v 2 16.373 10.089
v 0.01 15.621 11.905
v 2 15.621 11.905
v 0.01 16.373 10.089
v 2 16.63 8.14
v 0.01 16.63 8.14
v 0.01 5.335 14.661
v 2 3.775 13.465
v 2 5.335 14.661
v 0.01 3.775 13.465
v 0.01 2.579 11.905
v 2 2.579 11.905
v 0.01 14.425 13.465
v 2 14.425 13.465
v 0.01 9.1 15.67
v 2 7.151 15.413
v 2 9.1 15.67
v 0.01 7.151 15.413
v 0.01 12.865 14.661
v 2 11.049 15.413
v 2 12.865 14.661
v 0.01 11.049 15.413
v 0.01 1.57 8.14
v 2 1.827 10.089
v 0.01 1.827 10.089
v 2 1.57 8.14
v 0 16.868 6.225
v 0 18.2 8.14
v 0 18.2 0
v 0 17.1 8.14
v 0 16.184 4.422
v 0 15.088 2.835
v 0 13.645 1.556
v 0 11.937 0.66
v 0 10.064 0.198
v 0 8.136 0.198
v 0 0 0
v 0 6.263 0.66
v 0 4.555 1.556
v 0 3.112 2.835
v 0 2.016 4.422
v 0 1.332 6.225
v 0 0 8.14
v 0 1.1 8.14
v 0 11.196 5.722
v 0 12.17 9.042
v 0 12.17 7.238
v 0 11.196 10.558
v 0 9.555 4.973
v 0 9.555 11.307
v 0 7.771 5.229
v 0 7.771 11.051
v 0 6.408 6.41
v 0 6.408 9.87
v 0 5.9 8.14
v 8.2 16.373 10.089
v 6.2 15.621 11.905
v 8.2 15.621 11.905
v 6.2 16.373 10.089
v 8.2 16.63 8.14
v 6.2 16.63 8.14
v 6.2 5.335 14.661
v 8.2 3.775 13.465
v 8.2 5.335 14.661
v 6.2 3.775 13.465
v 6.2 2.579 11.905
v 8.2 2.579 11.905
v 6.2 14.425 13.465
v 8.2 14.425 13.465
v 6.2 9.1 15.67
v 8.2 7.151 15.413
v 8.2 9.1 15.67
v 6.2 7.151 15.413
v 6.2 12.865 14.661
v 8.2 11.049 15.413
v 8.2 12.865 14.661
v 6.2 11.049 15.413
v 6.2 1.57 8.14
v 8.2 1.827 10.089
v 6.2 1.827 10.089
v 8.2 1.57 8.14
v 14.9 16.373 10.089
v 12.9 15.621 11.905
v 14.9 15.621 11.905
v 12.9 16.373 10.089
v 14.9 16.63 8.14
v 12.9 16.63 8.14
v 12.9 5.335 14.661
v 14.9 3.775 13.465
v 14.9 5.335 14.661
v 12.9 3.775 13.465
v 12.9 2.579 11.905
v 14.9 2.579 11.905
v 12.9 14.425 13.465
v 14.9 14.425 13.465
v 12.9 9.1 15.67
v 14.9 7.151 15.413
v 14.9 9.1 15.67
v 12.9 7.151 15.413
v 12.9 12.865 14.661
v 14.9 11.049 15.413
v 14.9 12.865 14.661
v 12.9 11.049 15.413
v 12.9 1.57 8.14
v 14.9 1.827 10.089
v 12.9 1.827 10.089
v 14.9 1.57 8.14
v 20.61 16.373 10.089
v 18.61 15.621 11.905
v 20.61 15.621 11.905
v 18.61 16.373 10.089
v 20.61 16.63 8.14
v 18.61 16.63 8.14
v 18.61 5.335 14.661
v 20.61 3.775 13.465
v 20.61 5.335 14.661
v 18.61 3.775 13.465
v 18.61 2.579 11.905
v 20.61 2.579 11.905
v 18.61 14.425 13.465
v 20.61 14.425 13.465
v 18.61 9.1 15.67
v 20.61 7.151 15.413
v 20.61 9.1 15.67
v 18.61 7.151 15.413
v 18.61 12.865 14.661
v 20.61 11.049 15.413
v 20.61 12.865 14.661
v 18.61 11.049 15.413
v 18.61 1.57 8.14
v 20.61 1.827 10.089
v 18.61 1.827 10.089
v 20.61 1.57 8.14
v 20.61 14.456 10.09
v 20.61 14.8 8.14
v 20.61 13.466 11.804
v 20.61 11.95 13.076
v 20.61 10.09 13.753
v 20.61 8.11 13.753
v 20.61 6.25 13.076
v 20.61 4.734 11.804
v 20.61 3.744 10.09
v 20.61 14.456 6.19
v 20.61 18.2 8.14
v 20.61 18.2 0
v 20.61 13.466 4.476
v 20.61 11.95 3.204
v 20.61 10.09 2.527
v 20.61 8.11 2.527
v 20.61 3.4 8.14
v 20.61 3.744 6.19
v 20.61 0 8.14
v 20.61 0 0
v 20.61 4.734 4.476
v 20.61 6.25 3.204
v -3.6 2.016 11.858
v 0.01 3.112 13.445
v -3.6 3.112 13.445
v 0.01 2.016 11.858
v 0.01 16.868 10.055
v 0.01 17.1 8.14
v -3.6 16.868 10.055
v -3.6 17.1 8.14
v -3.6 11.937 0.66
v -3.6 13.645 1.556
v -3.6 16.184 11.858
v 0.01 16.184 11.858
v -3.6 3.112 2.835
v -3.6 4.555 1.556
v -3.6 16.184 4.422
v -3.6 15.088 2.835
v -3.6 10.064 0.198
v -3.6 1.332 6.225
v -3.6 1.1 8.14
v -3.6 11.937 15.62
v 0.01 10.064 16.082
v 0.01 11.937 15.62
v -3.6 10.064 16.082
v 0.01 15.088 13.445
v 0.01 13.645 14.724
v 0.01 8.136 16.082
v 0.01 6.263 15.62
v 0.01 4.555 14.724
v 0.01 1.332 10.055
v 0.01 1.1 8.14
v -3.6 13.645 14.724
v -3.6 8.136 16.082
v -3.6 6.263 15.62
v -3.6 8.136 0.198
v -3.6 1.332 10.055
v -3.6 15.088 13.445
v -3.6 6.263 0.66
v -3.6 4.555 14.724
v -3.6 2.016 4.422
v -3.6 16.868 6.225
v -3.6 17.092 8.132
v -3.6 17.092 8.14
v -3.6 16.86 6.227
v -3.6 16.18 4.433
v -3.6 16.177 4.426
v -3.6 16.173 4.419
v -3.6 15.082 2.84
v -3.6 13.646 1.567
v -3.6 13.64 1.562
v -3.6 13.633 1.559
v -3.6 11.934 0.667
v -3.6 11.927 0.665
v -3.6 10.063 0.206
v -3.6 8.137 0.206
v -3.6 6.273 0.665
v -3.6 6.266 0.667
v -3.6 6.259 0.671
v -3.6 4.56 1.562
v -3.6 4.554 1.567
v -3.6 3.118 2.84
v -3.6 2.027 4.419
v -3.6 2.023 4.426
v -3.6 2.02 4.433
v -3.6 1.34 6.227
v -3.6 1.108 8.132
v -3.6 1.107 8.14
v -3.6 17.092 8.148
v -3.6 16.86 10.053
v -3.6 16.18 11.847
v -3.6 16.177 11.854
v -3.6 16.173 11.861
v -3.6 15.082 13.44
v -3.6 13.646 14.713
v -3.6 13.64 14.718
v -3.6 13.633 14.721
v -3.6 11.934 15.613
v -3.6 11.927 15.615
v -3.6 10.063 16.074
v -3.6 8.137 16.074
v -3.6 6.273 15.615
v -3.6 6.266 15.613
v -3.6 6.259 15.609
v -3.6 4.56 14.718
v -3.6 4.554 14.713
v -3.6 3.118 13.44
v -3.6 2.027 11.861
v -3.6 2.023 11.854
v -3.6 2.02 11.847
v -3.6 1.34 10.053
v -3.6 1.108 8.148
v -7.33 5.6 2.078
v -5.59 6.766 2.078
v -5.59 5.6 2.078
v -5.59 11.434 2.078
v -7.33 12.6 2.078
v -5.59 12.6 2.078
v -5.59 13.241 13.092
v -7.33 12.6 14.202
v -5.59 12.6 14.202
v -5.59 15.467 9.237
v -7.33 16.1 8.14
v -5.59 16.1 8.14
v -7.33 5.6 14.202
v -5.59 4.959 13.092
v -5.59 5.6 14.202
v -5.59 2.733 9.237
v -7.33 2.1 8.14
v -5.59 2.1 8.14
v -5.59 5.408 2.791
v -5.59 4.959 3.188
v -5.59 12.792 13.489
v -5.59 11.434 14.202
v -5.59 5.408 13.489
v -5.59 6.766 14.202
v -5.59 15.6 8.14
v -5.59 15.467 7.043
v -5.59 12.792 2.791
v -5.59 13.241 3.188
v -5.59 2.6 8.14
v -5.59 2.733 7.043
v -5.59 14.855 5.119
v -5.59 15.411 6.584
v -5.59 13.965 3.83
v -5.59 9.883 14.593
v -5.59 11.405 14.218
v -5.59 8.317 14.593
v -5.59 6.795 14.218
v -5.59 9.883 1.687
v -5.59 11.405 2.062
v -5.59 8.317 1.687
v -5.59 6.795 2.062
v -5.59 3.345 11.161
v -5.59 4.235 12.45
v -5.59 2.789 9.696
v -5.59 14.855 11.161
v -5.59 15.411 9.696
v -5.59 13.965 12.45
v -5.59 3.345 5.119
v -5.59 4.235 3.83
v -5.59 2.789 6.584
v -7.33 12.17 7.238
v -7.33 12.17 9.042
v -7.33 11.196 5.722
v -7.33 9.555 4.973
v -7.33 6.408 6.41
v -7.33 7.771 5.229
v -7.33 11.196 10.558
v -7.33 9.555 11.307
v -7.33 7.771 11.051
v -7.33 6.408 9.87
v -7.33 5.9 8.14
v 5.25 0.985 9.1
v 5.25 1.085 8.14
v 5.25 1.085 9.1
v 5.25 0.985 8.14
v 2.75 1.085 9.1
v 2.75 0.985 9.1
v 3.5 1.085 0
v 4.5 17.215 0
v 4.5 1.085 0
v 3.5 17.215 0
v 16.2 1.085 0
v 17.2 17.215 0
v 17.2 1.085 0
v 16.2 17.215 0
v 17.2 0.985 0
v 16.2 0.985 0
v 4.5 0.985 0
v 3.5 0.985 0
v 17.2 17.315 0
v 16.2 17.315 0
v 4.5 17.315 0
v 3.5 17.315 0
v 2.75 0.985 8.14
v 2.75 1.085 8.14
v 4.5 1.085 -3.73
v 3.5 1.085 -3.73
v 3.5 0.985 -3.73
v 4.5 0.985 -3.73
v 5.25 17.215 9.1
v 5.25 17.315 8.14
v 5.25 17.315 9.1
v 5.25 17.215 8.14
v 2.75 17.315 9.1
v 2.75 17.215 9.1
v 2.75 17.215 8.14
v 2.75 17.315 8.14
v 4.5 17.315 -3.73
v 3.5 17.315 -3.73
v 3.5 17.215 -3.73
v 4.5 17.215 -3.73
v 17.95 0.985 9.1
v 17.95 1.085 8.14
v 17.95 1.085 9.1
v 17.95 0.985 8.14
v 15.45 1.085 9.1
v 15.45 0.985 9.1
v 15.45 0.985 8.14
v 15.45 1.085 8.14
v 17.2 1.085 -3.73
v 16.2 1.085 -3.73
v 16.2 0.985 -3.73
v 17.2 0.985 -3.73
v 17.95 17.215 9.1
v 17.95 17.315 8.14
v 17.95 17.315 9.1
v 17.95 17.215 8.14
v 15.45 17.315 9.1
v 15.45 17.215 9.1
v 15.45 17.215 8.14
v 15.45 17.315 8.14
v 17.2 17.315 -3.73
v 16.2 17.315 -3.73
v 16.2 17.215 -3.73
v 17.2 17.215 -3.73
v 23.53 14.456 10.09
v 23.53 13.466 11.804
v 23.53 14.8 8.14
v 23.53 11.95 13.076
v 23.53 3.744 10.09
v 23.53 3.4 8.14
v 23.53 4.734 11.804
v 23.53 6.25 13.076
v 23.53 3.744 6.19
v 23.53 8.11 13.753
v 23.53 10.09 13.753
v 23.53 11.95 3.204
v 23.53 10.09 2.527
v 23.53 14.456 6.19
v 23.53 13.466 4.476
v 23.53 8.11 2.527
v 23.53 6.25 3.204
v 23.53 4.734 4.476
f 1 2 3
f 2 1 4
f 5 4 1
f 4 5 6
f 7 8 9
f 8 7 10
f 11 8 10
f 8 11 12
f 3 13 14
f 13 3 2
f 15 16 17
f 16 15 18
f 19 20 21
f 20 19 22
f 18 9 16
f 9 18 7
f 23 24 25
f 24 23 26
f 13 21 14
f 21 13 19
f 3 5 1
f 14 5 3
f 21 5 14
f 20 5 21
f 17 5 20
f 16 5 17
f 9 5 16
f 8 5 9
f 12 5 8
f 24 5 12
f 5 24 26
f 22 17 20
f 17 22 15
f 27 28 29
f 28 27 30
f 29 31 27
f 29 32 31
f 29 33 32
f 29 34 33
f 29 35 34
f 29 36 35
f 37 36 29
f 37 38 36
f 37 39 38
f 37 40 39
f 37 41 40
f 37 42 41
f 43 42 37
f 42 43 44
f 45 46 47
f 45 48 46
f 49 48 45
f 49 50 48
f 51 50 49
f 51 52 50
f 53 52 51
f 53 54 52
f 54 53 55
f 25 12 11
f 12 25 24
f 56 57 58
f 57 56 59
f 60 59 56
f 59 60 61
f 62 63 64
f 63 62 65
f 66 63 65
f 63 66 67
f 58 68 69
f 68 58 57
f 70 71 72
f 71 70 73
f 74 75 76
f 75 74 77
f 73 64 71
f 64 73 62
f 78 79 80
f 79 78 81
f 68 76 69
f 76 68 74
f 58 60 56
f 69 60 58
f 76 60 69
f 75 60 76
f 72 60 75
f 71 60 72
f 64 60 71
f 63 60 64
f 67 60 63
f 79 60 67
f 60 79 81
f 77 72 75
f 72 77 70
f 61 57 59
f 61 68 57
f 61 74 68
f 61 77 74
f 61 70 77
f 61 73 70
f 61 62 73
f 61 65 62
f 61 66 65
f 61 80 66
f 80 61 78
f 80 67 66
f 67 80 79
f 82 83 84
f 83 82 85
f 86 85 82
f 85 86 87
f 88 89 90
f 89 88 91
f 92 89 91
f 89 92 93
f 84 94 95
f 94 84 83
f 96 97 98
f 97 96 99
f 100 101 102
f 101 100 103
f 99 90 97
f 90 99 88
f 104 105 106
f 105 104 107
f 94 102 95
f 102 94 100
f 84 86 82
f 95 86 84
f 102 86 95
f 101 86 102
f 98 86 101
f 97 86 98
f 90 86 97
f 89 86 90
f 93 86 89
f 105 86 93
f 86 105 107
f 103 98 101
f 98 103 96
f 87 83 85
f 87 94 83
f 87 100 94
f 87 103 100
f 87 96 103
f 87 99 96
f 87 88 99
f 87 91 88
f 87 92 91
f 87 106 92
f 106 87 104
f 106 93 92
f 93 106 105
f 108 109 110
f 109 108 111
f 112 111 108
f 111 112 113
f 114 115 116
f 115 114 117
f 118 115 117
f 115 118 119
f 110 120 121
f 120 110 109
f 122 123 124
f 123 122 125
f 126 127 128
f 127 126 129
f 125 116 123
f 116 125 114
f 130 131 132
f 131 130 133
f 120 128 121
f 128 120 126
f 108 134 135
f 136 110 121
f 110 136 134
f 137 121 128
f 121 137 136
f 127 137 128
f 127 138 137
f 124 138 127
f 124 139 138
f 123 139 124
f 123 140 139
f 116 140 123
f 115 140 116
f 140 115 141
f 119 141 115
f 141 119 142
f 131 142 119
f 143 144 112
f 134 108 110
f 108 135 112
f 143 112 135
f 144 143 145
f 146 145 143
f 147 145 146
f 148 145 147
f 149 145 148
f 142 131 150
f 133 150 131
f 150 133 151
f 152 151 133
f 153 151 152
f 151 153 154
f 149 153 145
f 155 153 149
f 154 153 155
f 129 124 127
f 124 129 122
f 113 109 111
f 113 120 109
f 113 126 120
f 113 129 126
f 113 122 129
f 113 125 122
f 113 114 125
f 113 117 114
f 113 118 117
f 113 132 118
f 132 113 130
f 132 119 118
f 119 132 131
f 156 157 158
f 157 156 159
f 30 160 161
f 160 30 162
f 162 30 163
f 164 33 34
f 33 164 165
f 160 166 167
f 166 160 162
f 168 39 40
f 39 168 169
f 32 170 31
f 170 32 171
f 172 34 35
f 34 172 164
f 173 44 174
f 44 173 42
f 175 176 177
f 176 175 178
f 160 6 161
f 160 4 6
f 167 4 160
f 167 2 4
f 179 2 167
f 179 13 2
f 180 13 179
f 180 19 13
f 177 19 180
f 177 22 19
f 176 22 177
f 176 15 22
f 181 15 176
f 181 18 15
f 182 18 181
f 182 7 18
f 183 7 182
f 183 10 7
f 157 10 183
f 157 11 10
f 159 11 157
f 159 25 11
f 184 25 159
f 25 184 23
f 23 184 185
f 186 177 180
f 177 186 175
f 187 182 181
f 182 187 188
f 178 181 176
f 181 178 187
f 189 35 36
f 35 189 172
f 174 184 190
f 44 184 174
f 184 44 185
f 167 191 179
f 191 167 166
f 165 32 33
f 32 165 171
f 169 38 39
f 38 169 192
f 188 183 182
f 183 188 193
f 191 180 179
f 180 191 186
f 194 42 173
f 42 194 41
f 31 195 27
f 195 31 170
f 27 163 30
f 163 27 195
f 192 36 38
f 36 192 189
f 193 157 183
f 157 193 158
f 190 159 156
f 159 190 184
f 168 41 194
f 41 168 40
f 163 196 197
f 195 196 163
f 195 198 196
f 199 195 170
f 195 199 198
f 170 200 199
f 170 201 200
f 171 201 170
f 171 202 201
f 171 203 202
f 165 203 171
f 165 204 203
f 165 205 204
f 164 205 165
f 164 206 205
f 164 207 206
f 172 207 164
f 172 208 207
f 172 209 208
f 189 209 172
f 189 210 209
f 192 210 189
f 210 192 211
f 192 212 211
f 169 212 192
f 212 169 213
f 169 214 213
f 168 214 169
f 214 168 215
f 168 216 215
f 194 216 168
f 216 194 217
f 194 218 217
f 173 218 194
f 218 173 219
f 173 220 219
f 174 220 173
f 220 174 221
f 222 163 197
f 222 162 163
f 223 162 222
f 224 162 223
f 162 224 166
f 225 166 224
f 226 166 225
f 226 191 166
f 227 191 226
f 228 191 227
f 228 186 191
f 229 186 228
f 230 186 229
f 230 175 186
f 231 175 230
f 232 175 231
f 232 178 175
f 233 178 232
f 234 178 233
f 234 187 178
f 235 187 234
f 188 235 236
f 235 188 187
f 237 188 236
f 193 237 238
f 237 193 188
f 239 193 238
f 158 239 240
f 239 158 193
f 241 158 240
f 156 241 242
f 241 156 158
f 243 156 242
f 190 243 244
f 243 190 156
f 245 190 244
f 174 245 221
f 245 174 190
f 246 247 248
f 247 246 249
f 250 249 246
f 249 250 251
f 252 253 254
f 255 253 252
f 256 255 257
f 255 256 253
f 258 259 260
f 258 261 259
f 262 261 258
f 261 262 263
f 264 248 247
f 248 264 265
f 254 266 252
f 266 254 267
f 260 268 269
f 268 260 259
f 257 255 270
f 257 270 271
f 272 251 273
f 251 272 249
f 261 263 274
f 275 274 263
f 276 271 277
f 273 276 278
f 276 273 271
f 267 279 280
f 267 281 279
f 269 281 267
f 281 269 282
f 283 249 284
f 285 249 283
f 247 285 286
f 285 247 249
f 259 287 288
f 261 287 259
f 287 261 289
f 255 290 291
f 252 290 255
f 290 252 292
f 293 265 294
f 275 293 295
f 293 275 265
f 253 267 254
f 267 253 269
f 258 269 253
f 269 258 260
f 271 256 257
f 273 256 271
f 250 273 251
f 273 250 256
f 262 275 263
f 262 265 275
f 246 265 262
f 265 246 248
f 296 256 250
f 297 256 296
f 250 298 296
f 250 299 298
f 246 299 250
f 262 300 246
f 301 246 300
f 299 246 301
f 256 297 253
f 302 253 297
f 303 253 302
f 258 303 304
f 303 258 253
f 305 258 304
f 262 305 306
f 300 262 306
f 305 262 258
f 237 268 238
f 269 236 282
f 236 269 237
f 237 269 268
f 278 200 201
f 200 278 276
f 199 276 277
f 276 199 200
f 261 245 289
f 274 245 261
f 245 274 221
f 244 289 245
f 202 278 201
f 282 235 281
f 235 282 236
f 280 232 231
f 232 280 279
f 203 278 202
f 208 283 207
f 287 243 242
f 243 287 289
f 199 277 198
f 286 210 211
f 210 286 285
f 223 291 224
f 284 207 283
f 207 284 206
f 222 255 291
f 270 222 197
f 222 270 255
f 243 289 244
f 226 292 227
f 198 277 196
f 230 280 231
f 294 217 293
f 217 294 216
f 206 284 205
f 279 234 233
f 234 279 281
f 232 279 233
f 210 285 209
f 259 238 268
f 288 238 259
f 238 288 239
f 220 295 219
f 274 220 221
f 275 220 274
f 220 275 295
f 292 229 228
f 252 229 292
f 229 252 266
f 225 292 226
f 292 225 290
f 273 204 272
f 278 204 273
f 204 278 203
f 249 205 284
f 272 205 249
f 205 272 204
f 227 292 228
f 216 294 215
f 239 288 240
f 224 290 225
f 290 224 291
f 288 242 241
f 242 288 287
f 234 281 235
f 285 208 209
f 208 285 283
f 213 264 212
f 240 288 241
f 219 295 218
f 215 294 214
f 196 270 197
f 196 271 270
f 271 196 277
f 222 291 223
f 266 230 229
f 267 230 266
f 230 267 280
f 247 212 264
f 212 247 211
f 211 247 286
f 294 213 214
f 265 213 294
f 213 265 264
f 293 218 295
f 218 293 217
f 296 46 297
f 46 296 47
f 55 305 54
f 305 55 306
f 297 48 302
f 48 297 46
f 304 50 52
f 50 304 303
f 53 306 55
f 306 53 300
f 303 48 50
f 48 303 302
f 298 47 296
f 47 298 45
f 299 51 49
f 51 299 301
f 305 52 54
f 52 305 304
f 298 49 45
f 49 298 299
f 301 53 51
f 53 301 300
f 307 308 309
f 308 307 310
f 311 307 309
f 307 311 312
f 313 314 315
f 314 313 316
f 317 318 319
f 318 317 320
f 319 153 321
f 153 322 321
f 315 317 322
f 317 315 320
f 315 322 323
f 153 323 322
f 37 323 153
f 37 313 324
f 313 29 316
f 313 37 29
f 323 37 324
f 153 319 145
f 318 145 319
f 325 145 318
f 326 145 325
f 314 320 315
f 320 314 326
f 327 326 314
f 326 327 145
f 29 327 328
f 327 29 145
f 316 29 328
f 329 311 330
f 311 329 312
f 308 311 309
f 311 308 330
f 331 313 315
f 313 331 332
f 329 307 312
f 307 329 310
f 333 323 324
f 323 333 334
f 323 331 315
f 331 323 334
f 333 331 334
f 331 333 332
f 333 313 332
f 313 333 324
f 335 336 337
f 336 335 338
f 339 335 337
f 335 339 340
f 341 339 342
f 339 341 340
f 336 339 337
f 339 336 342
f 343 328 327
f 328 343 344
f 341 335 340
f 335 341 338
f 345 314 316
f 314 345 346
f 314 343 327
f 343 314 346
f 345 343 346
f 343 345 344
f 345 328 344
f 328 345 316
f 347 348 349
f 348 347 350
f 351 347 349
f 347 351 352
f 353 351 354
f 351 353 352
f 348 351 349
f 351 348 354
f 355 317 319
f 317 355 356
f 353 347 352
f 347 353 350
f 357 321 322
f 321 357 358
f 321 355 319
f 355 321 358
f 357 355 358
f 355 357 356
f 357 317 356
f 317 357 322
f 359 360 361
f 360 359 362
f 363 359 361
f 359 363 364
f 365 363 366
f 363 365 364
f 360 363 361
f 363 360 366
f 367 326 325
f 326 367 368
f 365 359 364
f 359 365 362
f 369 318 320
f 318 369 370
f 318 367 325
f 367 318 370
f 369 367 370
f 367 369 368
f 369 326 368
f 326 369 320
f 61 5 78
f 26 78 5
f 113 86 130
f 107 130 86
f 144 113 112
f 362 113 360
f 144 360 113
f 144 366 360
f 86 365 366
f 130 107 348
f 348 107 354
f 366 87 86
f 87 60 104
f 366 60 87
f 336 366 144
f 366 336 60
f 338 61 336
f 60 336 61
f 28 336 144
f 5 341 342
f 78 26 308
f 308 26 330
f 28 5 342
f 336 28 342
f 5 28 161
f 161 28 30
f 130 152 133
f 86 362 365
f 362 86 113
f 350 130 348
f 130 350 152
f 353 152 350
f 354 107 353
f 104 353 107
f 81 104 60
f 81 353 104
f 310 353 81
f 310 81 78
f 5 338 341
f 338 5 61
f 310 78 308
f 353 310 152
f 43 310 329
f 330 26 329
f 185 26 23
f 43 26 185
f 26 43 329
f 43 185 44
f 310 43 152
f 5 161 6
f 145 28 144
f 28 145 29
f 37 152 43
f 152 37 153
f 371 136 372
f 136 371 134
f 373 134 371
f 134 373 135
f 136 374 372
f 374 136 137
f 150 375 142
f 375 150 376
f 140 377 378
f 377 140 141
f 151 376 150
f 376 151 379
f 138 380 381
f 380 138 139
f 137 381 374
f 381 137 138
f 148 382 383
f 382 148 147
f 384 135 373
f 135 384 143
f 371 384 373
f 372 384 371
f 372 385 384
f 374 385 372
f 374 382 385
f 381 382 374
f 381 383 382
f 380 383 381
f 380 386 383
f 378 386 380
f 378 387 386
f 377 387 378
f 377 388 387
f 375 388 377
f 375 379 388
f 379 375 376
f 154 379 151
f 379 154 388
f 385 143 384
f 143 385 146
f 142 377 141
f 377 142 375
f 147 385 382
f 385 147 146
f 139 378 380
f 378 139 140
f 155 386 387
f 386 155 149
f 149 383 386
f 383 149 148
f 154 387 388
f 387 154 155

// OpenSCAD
/* 2014 Don Bosley : 
Neutrik Jack Set V 0.0
For updates/corrections email : don@bosleymusic.com
Mechanical Drawing
Compatible with Neutrik products : 
- mono jack, switched, chrome ferrule, straight PCB pins

NMJHCD2

*/

//MAIN BODY
translate([0,0,0])
color("black") 
cube([20.61,18.2,8.14]); 

//BODY SECTIONS
for (i = [ [0,9.1,8.14],
		   [6.2,9.1,8.14],
		   [12.9,9.1,8.14],
		   [18.61,9.1,8.14],
])
{
	color("black")
	translate(i)
	rotate([90,0,90])
	cylinder(r=15.67-8.14, h=2); 
}

//REAR CYLINDER
color("black")
translate([20.60,9.1,8.14])
rotate([90,0,90]) 
cylinder(r=5.7,h=23.53-20.60);


difference(){
	union(){
		//NUT
		color("lightgrey")
		translate([-5.59, 9.1,8.14])
		rotate([90,0,-90])
		cylinder(r=7,h=1.74, $fn=6); 
		//FRONT WASHERS
		for (i = [ [-1.2,9.1,8.14],
		 		  [-2.4,9.1,8.14],
				  [-3.6,9.1,8.14]
 		])
		{
			color("black")
			translate(i)
			rotate([90,0,90])
			cylinder(r=8, h=1.21); 
		}
		//FRONT BEVEL
		color("black")
		translate([-3.59, 9.1,8.14])
		rotate([90,0,-90])
		cylinder(r2=6.5, r1=8,h=2); 
	}
//NUTHOLE
color("black")
translate([8, 9.1,8.14])
rotate([90,0,-90])
cylinder(r=3.2,h=24); 
}

/*ENSURE PIN CENTERS ARE ALIGNED (COMMENT OUT)
for (i = [  [4,2.23/2,-2],//S
		   [4,18.2-2.23/2,-2],//SN
		   [16.7,2.23/2,-2],//T
		   [16.7,18.2-2.23/2,-2],//TN

 ])
{
	translate(i)
	color("blue")
	cylinder(r=.7, h=9);
}
*/

//PINS 
for(i = [
	     [4-1.25,.985,0],//S
		 [4-1.25,18.2-.985,0],//SN
	     [16.7-1.25,.985,0],//T
		 [16.7-1.25,18.2-.985,0],//TN

])
{
	translate(i)
	color("lightgrey") 
	union(){
		cube([2.5,.1,9.1]);  
		translate([.75,0,-3.73])
		cube([1,.1,3.75]);}
}
